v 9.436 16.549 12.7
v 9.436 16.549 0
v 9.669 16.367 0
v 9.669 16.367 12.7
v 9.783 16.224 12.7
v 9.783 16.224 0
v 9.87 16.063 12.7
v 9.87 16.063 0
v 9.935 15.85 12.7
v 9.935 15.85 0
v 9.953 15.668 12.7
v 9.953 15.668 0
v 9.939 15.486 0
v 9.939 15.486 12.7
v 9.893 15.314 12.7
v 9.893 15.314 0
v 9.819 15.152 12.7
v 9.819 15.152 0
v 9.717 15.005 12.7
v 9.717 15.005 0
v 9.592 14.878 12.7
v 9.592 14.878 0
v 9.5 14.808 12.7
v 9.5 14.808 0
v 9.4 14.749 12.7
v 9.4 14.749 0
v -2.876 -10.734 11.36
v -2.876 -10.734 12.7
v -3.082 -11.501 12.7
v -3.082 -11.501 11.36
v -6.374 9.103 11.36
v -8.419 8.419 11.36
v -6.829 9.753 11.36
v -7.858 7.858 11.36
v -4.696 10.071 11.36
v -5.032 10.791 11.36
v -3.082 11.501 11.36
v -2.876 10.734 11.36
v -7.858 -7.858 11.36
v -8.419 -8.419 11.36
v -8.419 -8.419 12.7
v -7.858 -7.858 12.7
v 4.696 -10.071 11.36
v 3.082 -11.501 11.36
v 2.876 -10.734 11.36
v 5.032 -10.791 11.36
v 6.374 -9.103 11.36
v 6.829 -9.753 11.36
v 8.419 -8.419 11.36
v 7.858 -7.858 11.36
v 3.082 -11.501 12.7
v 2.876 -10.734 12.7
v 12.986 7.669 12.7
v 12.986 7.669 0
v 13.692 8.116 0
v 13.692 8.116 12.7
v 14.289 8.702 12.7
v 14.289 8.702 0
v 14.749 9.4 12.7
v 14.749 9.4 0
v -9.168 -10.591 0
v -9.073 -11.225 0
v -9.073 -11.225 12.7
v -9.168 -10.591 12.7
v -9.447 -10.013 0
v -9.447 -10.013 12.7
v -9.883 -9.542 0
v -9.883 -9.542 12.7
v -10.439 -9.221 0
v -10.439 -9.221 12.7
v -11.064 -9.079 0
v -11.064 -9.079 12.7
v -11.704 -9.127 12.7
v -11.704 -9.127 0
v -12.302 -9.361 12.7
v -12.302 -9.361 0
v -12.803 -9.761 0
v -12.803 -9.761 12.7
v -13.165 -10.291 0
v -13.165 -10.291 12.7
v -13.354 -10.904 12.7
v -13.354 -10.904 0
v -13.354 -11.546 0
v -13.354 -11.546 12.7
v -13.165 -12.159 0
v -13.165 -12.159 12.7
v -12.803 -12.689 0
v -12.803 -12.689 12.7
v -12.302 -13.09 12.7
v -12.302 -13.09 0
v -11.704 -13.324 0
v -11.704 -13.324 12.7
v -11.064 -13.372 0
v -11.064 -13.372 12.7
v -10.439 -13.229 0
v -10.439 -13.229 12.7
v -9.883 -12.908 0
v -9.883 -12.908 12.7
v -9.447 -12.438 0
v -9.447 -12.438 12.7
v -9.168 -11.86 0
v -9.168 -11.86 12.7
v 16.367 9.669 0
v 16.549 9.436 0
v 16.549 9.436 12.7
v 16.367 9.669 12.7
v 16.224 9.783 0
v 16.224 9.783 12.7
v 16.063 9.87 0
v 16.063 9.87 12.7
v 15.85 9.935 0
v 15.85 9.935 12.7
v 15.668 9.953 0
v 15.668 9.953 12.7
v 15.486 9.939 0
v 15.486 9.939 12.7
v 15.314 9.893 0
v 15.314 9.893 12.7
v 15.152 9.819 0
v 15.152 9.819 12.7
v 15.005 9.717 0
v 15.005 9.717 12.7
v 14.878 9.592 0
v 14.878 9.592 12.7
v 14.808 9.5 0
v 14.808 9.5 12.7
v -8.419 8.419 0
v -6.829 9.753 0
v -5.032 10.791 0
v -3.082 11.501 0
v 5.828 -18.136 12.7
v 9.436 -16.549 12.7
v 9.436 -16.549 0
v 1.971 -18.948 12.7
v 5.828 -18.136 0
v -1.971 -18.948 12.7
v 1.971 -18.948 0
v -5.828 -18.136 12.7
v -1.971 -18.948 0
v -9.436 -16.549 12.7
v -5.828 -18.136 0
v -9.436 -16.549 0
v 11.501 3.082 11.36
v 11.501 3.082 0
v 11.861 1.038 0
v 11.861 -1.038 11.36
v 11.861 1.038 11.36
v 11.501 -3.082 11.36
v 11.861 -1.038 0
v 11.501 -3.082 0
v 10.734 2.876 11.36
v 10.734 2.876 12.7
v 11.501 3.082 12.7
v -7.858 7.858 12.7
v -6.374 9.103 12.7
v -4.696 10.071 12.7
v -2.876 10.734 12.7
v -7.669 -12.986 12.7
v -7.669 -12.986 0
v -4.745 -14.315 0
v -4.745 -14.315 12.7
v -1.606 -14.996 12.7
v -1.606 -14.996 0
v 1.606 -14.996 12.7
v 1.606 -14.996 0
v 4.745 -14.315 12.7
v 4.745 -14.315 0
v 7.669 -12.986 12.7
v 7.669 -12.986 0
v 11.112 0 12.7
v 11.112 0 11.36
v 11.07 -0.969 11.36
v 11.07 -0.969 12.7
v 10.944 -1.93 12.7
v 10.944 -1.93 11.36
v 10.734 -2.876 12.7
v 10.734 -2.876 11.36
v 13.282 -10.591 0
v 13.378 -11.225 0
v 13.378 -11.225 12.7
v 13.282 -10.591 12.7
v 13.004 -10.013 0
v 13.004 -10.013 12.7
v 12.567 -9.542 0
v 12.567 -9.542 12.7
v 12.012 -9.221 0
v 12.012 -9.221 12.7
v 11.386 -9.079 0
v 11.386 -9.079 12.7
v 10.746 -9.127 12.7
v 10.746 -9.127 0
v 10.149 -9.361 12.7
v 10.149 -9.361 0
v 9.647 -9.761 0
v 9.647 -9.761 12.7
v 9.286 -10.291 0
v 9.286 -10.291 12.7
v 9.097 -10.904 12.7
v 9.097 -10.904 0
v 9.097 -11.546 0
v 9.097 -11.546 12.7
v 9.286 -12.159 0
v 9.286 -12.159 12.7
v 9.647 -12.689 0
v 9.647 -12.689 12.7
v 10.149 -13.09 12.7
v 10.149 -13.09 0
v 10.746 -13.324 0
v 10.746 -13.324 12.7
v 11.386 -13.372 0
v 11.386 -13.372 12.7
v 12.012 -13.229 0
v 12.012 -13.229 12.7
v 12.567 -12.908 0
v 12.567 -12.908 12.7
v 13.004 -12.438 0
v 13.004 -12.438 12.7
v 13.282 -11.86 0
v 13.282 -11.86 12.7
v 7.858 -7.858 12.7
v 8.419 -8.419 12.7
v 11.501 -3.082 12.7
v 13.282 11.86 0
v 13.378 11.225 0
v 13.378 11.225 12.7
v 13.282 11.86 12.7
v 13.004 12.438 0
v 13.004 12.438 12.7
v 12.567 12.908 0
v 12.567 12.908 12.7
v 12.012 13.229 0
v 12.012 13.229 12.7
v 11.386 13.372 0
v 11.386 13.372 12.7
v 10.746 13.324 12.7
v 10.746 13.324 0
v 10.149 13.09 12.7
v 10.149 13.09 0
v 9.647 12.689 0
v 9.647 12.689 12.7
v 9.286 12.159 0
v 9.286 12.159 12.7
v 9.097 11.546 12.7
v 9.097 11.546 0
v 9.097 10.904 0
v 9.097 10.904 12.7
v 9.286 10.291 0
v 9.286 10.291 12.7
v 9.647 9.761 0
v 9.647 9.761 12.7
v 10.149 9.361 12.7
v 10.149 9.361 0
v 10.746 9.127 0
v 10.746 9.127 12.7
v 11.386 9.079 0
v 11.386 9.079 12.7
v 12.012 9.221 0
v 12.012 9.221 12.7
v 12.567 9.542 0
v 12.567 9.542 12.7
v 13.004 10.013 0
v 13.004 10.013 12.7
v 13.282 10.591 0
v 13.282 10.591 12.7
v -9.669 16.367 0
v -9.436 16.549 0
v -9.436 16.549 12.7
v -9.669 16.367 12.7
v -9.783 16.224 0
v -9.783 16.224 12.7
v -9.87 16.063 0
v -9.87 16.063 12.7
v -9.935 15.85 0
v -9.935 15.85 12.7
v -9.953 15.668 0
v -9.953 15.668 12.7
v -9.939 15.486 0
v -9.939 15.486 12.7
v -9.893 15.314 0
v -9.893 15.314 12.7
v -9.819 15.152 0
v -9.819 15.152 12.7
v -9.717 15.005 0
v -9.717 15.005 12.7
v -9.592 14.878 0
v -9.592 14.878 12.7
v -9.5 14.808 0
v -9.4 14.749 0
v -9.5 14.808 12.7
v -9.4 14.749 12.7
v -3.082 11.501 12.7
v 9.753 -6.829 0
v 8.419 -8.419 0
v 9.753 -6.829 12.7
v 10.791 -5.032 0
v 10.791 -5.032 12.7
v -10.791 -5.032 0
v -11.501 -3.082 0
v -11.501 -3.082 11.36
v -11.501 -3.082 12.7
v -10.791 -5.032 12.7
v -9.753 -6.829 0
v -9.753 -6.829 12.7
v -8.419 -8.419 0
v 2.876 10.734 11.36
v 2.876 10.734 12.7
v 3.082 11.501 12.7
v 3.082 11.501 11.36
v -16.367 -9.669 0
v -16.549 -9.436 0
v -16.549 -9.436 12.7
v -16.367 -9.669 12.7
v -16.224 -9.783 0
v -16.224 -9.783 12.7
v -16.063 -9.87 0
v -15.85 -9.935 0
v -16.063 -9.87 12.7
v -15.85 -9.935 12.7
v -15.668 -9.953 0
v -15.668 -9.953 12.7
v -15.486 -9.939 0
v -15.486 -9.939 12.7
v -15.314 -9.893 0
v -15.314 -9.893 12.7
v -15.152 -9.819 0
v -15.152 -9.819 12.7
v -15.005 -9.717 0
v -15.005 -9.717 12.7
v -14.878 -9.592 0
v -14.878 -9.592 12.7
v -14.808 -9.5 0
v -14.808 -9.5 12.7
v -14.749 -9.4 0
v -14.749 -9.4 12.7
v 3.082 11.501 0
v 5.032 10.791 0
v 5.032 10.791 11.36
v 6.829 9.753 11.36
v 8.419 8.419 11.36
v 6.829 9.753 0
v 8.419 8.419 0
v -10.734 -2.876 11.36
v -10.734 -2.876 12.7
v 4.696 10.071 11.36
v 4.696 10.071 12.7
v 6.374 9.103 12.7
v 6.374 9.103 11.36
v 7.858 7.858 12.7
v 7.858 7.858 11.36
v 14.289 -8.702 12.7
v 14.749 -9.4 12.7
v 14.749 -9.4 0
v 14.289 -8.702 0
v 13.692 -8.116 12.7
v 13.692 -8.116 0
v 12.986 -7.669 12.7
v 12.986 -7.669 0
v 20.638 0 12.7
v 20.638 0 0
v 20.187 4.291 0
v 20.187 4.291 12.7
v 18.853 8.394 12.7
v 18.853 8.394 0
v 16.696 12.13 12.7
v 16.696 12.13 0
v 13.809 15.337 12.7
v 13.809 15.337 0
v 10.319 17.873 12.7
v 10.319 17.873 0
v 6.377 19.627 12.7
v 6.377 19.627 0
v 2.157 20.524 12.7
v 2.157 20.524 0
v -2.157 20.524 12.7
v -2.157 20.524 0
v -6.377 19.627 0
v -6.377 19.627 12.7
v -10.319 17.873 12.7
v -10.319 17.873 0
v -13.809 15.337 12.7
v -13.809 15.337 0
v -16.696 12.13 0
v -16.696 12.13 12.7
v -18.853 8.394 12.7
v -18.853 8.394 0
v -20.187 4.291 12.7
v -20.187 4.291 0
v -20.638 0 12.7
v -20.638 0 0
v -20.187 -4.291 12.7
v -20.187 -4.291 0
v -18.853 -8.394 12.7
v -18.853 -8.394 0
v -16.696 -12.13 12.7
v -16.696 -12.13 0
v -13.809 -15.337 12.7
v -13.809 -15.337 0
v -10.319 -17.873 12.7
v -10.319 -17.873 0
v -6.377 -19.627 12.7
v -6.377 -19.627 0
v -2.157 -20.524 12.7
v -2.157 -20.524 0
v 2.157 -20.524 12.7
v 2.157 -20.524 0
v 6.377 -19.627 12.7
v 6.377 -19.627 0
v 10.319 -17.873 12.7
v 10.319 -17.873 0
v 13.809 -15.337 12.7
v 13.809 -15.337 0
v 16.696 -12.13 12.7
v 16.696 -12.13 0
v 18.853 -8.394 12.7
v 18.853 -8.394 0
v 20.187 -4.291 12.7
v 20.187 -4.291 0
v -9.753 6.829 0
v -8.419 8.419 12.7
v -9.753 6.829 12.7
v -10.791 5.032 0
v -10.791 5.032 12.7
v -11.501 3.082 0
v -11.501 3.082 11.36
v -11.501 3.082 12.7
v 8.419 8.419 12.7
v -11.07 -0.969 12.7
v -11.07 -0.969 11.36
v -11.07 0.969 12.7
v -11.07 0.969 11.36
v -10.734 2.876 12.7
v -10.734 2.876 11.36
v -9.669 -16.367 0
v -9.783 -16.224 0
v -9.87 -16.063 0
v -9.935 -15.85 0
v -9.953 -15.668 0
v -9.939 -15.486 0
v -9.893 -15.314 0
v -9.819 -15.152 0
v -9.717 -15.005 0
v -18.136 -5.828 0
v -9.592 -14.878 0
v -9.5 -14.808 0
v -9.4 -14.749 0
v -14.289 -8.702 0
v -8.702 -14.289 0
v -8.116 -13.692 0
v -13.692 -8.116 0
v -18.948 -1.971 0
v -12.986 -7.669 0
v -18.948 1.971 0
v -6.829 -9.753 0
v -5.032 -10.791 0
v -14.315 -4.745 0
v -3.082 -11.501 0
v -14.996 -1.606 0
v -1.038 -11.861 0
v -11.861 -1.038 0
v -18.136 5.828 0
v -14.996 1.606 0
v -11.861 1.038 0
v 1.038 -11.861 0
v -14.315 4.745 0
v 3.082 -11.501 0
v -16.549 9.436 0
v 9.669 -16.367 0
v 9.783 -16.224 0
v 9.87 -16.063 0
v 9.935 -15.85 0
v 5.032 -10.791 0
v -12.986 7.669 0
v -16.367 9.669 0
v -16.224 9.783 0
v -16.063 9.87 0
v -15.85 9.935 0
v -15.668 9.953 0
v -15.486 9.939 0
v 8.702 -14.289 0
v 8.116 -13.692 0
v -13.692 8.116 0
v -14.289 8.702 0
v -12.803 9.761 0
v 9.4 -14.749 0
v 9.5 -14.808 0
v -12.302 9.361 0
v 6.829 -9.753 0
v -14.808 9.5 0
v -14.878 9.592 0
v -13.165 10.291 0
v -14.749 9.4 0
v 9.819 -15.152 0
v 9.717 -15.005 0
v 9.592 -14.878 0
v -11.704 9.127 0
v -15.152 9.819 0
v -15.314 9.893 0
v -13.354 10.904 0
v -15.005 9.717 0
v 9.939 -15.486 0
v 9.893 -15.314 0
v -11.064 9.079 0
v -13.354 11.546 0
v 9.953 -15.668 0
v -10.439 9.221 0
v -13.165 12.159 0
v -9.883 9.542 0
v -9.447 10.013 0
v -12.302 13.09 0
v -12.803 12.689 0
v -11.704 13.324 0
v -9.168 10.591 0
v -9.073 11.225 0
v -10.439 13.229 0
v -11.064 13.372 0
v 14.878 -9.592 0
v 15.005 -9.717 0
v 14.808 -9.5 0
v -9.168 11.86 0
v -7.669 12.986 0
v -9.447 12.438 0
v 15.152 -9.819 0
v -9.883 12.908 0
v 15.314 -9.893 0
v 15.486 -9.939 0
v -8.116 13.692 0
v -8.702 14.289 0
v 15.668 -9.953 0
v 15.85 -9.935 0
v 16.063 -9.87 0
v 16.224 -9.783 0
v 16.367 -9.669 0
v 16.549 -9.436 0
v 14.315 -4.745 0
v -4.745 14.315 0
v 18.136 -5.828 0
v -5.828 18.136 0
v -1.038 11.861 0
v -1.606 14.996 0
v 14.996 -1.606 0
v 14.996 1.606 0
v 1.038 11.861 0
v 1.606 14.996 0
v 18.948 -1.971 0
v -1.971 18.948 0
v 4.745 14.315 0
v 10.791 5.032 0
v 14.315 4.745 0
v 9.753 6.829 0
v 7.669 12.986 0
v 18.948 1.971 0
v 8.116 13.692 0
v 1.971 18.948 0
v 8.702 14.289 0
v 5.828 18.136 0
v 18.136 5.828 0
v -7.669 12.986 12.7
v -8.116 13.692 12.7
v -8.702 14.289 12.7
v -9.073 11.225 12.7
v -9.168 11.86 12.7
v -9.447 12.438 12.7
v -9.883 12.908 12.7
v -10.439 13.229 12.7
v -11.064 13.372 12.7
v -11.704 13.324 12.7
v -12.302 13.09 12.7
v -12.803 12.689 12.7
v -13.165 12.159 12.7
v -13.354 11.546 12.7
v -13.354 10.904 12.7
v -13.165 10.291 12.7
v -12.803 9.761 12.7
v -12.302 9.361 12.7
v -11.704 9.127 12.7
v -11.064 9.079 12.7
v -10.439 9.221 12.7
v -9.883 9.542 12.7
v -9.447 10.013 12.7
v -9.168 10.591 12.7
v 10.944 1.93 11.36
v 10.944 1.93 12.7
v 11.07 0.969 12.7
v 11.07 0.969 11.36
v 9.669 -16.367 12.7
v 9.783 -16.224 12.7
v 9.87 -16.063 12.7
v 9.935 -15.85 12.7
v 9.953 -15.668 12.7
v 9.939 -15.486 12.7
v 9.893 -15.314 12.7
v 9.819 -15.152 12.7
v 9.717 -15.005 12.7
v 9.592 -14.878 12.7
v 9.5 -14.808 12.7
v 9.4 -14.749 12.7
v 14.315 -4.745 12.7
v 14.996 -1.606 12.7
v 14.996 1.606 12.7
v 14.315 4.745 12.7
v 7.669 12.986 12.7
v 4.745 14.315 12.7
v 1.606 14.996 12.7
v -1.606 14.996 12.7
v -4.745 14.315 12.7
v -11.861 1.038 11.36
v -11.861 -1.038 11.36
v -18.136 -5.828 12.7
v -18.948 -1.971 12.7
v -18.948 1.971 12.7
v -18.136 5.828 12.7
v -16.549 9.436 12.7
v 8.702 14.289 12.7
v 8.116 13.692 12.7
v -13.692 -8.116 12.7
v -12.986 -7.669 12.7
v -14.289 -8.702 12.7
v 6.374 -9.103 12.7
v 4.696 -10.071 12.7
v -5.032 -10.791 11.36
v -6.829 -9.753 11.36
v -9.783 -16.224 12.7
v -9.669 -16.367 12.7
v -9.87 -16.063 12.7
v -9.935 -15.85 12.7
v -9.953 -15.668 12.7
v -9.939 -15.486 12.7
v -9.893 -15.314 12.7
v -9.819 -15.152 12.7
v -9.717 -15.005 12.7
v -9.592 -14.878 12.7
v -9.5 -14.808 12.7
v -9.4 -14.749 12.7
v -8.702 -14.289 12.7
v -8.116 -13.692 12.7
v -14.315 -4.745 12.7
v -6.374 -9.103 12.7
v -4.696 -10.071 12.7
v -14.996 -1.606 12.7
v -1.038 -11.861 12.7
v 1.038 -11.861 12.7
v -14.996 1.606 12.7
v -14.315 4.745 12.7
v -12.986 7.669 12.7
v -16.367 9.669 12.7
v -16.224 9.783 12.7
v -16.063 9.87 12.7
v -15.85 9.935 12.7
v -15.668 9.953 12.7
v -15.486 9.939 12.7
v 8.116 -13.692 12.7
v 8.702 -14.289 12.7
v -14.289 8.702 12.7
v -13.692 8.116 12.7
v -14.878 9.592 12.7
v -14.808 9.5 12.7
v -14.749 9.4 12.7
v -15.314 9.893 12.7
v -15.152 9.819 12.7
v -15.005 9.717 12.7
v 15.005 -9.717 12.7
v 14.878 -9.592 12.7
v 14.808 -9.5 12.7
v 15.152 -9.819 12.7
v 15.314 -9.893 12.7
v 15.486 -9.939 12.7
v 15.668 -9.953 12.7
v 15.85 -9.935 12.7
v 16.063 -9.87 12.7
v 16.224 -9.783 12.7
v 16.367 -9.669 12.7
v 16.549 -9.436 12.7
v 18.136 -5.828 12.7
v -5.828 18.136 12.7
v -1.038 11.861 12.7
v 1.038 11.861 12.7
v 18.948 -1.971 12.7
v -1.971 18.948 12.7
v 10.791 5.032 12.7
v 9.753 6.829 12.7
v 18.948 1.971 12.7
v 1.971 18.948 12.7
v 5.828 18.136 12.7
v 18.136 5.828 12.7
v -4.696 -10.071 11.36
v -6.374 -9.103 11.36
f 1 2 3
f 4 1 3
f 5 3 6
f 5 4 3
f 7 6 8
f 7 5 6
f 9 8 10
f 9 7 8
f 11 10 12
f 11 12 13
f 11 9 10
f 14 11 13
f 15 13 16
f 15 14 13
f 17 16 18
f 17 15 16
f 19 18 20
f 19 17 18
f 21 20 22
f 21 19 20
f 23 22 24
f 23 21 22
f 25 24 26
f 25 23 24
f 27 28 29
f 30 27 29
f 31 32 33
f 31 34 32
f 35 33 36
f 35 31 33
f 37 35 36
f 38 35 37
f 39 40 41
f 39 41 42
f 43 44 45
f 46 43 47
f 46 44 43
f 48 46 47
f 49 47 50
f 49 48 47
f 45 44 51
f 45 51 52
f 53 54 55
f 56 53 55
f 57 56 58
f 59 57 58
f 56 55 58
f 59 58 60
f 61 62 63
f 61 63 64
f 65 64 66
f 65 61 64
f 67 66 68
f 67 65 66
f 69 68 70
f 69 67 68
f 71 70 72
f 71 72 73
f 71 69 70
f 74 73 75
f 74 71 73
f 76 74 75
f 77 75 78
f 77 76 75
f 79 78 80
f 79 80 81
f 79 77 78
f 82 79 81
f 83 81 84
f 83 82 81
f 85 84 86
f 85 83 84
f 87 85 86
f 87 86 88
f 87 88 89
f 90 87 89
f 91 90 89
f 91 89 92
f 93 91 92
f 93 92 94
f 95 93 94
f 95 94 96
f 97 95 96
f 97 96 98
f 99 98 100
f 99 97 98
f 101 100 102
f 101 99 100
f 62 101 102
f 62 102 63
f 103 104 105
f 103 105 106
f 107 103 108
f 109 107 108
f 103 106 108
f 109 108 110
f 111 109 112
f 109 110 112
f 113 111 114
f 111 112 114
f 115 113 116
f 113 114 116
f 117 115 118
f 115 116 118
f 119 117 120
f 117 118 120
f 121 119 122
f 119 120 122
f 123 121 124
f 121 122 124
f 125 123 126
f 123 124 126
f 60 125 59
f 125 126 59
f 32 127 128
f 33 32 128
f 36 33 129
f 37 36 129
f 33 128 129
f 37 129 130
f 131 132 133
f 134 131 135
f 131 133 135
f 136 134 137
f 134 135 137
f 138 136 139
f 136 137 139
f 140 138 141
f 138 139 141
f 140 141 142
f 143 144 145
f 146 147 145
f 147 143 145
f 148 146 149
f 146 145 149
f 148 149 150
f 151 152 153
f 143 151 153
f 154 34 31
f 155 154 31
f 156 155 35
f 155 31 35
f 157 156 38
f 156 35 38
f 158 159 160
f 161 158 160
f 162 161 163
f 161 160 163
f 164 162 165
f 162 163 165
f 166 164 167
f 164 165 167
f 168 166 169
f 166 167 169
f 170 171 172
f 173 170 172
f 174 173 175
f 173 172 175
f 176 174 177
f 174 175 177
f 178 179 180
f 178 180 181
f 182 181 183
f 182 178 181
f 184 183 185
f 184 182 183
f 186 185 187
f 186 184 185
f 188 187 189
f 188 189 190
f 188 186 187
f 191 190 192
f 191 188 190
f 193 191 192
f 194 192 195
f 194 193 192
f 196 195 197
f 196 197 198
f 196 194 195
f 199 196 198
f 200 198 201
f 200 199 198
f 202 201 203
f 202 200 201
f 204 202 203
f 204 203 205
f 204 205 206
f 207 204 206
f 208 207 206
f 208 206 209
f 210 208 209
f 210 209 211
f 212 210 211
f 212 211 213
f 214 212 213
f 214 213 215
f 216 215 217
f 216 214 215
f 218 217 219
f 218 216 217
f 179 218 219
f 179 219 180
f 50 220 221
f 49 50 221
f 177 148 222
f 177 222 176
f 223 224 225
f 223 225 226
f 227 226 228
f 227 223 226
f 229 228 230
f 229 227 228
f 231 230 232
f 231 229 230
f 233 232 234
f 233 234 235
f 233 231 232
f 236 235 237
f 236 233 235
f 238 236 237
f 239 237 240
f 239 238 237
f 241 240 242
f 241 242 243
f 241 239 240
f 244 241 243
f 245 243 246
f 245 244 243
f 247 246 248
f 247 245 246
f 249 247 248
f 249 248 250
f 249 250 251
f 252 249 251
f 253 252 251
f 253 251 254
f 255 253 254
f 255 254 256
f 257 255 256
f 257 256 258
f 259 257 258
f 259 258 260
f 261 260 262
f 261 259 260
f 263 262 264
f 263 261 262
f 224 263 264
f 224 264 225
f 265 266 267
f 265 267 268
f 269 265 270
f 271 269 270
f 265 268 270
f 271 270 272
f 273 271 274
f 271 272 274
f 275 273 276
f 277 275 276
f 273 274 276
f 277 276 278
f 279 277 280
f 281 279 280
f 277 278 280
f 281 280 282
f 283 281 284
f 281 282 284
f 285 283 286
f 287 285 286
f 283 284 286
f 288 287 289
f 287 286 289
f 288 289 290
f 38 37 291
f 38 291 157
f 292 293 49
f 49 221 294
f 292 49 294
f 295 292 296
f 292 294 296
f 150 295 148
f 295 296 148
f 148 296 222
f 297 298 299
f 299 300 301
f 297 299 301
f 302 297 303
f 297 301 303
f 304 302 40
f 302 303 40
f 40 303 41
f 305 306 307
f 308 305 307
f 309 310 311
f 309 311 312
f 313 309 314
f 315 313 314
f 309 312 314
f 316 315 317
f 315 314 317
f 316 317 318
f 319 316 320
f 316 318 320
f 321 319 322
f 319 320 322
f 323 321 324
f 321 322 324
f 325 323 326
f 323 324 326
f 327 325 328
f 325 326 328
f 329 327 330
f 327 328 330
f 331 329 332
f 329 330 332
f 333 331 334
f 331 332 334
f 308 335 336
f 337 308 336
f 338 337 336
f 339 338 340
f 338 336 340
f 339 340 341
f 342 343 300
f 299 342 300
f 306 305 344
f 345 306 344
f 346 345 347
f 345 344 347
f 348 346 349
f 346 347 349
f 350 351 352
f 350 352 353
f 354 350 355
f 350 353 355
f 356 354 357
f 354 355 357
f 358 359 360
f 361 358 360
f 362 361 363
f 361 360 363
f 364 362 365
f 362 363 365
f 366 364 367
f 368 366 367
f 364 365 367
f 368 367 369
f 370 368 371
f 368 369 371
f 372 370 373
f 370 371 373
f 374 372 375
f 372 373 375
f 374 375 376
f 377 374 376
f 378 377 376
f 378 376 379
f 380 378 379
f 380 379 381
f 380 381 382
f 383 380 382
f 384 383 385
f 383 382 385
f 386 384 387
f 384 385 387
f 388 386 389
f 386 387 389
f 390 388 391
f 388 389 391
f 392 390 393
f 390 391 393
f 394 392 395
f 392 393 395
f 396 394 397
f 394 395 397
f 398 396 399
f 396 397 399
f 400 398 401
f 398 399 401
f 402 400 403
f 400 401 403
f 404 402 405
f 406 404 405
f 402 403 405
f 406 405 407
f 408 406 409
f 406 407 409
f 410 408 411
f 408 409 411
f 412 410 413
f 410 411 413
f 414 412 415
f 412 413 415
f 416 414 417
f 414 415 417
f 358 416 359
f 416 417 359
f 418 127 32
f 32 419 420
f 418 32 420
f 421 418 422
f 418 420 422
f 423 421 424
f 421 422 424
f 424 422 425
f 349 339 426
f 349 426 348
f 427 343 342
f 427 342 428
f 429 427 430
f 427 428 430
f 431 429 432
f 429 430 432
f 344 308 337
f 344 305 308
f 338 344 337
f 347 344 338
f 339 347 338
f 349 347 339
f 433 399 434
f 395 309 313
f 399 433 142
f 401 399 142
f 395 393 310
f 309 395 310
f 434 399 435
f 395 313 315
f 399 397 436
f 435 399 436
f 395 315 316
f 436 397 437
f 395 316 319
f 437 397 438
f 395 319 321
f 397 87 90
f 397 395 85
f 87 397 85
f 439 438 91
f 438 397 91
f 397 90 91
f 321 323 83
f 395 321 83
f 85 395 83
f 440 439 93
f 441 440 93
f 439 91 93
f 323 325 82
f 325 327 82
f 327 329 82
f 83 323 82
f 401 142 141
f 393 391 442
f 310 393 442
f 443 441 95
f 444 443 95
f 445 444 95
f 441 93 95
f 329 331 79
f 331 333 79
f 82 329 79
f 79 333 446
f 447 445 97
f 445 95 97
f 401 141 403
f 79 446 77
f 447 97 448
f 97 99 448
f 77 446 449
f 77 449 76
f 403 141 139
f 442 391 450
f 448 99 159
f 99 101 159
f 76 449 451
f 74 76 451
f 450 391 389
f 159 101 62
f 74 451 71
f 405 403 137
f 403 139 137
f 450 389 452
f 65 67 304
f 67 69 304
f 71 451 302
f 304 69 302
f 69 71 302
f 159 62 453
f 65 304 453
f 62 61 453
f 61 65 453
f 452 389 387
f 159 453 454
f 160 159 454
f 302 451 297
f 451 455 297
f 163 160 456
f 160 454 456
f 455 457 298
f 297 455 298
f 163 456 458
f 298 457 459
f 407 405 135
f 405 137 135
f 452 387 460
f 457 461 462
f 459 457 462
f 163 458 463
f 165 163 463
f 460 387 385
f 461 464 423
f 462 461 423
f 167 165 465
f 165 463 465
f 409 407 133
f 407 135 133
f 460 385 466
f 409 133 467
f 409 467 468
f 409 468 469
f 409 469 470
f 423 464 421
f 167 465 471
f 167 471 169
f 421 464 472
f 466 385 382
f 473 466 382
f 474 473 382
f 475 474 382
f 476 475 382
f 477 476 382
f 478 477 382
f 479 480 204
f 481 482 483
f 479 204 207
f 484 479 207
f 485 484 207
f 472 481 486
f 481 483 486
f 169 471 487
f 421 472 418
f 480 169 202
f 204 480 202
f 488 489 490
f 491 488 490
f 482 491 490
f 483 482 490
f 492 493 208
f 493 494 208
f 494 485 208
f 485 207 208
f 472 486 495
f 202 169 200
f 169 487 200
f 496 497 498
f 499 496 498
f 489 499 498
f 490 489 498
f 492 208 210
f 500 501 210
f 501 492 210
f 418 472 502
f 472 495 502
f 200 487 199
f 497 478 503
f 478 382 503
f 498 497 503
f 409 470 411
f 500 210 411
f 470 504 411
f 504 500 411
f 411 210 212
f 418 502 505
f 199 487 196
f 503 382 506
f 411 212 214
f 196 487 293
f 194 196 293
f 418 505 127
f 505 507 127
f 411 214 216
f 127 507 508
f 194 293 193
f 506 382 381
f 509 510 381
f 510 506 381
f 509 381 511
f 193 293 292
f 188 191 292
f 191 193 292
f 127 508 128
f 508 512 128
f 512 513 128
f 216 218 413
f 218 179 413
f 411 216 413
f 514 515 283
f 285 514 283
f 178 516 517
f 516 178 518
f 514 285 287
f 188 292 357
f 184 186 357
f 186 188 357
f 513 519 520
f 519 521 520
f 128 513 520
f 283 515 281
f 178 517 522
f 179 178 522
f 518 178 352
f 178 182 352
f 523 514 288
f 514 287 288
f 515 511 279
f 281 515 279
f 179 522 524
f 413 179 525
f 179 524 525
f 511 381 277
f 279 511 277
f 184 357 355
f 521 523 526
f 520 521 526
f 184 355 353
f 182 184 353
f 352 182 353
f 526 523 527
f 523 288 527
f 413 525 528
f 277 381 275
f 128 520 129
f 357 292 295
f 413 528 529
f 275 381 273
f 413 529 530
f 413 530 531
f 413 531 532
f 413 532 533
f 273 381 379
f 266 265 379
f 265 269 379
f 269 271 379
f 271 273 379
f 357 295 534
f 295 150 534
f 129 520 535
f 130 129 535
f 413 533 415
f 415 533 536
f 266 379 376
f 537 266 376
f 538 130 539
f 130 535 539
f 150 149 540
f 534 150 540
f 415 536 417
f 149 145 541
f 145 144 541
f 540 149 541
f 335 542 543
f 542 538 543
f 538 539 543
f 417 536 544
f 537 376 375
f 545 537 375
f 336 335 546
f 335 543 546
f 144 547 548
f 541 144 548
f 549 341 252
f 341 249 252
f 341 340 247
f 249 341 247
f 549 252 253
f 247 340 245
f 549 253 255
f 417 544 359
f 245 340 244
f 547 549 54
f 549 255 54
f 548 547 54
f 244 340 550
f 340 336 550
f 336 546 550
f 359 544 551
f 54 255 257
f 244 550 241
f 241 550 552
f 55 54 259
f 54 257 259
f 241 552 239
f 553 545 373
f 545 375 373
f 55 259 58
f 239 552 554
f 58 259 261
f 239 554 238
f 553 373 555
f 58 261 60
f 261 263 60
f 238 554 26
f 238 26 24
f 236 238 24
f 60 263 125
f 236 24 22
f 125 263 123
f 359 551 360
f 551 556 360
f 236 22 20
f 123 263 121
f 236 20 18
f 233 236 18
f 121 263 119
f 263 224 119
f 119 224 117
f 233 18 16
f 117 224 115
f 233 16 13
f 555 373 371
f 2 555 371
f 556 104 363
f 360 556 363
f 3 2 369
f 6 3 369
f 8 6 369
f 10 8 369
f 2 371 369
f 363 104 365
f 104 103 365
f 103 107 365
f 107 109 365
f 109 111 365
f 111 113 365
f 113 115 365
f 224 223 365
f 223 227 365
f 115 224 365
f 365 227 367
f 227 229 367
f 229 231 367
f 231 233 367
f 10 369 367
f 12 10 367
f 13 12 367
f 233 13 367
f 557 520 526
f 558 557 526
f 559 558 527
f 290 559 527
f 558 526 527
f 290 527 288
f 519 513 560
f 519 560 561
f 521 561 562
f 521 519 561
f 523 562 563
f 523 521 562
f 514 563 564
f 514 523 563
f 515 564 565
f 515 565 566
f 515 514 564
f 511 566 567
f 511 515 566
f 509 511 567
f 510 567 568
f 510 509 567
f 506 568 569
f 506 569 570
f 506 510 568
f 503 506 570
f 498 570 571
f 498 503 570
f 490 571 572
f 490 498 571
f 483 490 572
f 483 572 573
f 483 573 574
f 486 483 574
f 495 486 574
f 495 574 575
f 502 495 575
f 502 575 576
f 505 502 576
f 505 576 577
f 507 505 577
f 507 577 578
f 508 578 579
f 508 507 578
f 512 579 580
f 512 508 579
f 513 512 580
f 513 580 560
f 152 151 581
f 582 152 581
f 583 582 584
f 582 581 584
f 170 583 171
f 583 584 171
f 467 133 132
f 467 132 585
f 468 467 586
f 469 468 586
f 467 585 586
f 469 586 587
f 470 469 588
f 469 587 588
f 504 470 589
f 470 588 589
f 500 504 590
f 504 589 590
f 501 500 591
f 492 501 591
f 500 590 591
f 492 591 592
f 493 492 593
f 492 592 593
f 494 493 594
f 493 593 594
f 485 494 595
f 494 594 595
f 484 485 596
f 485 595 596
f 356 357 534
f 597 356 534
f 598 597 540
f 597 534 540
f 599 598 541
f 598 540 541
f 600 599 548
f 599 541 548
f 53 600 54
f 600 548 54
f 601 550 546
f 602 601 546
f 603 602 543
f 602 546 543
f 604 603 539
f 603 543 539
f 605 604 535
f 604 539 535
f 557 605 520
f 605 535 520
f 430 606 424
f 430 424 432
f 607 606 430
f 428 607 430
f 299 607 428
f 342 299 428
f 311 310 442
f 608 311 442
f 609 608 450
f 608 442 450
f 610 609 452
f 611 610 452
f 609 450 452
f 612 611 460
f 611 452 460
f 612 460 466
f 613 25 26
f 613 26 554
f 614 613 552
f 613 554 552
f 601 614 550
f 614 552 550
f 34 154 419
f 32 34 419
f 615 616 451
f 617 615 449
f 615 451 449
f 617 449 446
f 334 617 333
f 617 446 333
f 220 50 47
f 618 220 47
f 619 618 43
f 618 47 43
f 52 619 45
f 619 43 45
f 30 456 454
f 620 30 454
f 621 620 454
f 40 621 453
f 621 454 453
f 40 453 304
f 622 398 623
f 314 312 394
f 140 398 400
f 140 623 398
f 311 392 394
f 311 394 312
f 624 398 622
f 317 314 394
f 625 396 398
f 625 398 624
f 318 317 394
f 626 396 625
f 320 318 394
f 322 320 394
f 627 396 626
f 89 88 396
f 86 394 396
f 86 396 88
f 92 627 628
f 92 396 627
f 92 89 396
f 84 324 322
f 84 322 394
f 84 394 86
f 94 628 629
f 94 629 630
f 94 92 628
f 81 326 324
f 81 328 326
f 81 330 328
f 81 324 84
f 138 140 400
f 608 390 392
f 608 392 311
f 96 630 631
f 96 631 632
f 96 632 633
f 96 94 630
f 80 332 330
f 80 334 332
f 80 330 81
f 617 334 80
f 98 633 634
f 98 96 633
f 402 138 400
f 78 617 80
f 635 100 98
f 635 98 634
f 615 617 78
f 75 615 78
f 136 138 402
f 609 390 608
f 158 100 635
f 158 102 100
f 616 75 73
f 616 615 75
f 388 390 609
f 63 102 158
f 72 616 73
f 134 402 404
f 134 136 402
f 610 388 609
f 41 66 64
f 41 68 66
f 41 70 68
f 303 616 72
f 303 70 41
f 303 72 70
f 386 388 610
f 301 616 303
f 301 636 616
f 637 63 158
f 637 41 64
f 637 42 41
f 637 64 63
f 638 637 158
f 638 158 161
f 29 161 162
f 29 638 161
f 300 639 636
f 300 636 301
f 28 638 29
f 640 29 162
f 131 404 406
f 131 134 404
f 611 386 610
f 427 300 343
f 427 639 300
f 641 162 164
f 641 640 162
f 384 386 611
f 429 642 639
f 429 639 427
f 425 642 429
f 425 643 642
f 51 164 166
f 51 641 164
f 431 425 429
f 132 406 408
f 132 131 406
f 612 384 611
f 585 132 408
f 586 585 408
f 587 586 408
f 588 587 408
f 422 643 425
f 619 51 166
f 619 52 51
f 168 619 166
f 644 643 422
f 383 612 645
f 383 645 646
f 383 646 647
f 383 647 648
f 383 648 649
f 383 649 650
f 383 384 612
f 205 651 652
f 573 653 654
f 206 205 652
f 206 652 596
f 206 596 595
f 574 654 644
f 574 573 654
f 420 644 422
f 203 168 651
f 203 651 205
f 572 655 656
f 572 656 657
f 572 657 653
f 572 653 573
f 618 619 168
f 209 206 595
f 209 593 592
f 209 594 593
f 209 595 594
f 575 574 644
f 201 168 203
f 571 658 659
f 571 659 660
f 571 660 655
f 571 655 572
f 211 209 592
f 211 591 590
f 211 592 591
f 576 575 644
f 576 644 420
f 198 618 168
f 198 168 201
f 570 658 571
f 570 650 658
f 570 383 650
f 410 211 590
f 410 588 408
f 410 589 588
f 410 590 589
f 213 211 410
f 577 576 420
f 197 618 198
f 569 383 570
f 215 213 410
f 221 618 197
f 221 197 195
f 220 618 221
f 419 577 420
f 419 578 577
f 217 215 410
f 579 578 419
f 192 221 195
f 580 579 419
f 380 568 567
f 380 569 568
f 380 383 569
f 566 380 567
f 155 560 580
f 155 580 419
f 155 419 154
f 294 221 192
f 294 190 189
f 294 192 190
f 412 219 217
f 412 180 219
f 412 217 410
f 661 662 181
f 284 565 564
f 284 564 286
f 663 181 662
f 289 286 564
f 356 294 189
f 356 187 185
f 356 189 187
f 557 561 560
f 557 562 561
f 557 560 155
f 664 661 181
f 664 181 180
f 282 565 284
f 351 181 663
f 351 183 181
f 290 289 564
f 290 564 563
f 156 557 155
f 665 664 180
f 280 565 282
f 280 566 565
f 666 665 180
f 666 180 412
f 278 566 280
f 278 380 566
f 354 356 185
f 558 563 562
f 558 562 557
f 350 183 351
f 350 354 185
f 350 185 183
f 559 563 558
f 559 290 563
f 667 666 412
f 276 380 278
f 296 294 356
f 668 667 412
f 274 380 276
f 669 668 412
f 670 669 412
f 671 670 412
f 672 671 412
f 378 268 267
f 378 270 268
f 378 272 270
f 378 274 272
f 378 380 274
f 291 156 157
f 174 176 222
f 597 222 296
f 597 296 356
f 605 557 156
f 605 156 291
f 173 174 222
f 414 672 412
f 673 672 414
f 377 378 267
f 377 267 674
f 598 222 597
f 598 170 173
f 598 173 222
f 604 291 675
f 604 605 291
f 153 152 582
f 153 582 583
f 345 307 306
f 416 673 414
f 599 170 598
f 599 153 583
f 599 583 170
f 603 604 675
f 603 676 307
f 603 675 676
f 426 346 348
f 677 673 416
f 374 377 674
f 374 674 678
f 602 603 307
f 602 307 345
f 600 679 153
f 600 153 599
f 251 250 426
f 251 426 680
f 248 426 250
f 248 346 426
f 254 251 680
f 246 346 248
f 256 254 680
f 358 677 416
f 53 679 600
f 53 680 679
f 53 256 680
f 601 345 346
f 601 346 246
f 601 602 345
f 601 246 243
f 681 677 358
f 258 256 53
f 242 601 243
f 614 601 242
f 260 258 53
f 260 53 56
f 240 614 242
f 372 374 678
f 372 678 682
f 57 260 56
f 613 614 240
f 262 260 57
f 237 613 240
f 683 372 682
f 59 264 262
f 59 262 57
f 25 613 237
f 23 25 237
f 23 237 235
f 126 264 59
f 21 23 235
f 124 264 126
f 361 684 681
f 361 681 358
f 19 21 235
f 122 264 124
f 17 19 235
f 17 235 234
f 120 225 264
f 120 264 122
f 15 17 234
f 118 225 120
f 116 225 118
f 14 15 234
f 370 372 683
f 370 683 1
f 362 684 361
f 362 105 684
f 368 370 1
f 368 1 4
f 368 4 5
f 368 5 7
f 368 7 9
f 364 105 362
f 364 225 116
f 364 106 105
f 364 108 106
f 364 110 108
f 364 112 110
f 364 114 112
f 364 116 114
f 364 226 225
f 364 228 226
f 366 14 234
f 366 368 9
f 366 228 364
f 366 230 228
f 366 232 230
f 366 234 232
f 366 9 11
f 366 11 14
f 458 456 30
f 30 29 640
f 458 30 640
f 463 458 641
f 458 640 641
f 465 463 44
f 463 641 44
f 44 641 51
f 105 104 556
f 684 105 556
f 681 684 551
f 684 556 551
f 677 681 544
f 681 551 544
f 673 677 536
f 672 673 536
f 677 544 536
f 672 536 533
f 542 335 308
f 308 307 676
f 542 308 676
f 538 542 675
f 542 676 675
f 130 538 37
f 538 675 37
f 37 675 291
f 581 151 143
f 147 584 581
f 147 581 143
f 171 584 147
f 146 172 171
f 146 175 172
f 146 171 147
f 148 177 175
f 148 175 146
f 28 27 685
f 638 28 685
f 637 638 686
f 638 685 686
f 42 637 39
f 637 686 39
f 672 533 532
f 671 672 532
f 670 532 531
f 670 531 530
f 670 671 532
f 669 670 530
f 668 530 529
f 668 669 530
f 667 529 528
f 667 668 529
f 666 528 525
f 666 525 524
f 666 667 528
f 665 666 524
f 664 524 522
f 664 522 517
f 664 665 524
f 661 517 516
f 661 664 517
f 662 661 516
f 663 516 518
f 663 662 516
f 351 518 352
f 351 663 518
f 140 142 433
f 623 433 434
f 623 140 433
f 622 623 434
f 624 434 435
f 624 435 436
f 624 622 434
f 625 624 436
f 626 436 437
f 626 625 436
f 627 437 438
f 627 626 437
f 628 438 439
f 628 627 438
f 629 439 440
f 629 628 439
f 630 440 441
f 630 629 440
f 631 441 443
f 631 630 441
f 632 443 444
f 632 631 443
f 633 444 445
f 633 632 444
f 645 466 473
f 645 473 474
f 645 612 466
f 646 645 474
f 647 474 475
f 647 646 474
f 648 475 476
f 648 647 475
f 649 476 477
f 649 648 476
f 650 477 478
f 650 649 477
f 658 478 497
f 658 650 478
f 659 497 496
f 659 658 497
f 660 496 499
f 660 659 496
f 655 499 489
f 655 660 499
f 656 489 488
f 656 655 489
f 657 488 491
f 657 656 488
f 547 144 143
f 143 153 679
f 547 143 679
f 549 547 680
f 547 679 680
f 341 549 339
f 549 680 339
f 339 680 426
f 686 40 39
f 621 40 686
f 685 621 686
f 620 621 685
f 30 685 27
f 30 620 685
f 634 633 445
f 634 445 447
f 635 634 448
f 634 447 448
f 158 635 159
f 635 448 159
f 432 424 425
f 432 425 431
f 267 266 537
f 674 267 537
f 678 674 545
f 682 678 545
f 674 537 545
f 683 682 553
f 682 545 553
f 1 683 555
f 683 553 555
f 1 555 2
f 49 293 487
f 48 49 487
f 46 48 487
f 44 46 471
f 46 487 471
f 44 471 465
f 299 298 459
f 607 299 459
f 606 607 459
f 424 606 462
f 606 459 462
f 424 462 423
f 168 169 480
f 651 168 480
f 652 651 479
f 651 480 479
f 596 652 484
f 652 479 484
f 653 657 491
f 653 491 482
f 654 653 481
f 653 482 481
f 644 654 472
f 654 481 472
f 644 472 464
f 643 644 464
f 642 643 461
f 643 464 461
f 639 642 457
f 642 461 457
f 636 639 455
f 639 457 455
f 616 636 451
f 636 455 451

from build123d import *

# Parameters (mm, degrees)
F0_R            = 20.6375
F0_R_2          = 2.15265
F1_DEPTH        = 12.7
F3_DEPTH        = 12.7
F4_COUNT        = 6
F4_ANGLE        = 300
F6_R            = 11.90625
F7_DEPTH        = 11.36015
F9_DEPTH        = 12.7
F9_COPIES_COUNT = 4
F10_R           = 1.0241935484


# Not quite as in the source:
# - a pattern or mirror of a feature is missing from the dataset's text; its kind, count and spacing are read off the source's solid


with BuildPart() as f1:
    # F0 (on Top) → F1 (new body)
    with BuildSketch(Plane.XY):
        Circle(F0_R)
        with Locations((-11.2253201513, -11.2253201513)):
            Circle(F0_R_2, mode=Mode.SUBTRACT)
        with Locations((11.2253201513, -11.2253201513)):
            Circle(F0_R_2, mode=Mode.SUBTRACT)
        with Locations((-11.2253201513, 11.2253201513)):
            Circle(F0_R_2, mode=Mode.SUBTRACT)
        with BuildLine():
            ThreePointArc((0, 11.1125), (7.8577241059, 7.8577241059), (11.1125, 0))
            ThreePointArc((11.1125, 0), (-7.8577241059, -7.8577241059), (0, 11.1125))
        make_face(mode=Mode.SUBTRACT)
        with Locations((11.2253201513, 11.2253201513)):
            Circle(F0_R_2, mode=Mode.SUBTRACT)
    extrude(amount=F1_DEPTH)

    # F2 (on face) → F3 (cut, through all)
    with BuildSketch(Plane.XY.offset(12.7)):
        with BuildLine():
            ThreePointArc((-2.8761266387, 10.7338507446), (0, 11.1125), (2.8761266387, 10.7338507446))
            Line((2.8761266387, 10.7338507446), (3.0815642558, 11.5005543693))
            ThreePointArc((3.0815642558, 11.5005543693), (0, 11.90625), (-3.0815642558, 11.5005543693))
            Line((-3.0815642558, 11.5005543693), (-2.8761266387, 10.7338507446))
        make_face()
    f3 = extrude(amount=-F3_DEPTH, mode=Mode.SUBTRACT)

    # F4: F3 ×6 about axis
    f4_axis = Axis((0, 0, 0), (0, 0, -1))
    for i in range(1, F4_COUNT):
        add(f3.rotate(f4_axis, i * F4_ANGLE / (F4_COUNT - 1)), mode=Mode.SUBTRACT)

    # F6 (on face) → F7 (cut, through all)
    with BuildSketch(Plane(origin=(0, 0, 0), x_dir=(1, 0, 0), z_dir=(0, 0, -1))):
        Circle(F6_R)
    extrude(amount=-F7_DEPTH, mode=Mode.SUBTRACT)

    # F8 (on face) → F9 (cut, through all)
    with BuildSketch(Plane(origin=(0, 0, 0), x_dir=(1, 0, 0), z_dir=(0, 0, -1))):
        with BuildLine():
            ThreePointArc((11.5039191556, -15.1842795042), (9.251826165, -14.6686177057), (7.6685282311, -12.9860608474))
            ThreePointArc((7.6685282311, -12.9860608474), (0, -15.08125), (-7.6685282311, -12.9860608474))
            ThreePointArc((-7.6685282311, -12.9860608474), (-9.251826165, -14.6686177057), (-11.5039191556, -15.1842795042))
            ThreePointArc((-11.5039191556, -15.1842795042), (0, -19.05), (11.5039191556, -15.1842795042))
        make_face()
    f9 = extrude(amount=-F9_DEPTH, mode=Mode.SUBTRACT)

    # F9_copies: F9 ×4 about axis
    f9_copies_axis = Axis((0, 0, 0), (0, 0, 1))
    for i in range(1, F9_COPIES_COUNT):
        add(f9.rotate(f9_copies_axis, i * 360 / F9_COPIES_COUNT), mode=Mode.SUBTRACT)

    # F10
    f10_edges = [f1.edges().sort_by_distance(p)[0] for p in [
        (-11.503919, 15.18428, 6.35),
        (11.503919, 15.18428, 6.35),
        (11.503919, -15.18428, 6.35),
        (-11.503919, -15.18428, 6.35),
        (-15.18428, -11.503919, 6.35),
        (-15.18428, 11.503919, 6.35),
        (15.18428, 11.503919, 6.35),
        (15.18428, -11.503919, 6.35),
    ]]
    fillet(f10_edges, radius=F10_R)


solid = f1.part
